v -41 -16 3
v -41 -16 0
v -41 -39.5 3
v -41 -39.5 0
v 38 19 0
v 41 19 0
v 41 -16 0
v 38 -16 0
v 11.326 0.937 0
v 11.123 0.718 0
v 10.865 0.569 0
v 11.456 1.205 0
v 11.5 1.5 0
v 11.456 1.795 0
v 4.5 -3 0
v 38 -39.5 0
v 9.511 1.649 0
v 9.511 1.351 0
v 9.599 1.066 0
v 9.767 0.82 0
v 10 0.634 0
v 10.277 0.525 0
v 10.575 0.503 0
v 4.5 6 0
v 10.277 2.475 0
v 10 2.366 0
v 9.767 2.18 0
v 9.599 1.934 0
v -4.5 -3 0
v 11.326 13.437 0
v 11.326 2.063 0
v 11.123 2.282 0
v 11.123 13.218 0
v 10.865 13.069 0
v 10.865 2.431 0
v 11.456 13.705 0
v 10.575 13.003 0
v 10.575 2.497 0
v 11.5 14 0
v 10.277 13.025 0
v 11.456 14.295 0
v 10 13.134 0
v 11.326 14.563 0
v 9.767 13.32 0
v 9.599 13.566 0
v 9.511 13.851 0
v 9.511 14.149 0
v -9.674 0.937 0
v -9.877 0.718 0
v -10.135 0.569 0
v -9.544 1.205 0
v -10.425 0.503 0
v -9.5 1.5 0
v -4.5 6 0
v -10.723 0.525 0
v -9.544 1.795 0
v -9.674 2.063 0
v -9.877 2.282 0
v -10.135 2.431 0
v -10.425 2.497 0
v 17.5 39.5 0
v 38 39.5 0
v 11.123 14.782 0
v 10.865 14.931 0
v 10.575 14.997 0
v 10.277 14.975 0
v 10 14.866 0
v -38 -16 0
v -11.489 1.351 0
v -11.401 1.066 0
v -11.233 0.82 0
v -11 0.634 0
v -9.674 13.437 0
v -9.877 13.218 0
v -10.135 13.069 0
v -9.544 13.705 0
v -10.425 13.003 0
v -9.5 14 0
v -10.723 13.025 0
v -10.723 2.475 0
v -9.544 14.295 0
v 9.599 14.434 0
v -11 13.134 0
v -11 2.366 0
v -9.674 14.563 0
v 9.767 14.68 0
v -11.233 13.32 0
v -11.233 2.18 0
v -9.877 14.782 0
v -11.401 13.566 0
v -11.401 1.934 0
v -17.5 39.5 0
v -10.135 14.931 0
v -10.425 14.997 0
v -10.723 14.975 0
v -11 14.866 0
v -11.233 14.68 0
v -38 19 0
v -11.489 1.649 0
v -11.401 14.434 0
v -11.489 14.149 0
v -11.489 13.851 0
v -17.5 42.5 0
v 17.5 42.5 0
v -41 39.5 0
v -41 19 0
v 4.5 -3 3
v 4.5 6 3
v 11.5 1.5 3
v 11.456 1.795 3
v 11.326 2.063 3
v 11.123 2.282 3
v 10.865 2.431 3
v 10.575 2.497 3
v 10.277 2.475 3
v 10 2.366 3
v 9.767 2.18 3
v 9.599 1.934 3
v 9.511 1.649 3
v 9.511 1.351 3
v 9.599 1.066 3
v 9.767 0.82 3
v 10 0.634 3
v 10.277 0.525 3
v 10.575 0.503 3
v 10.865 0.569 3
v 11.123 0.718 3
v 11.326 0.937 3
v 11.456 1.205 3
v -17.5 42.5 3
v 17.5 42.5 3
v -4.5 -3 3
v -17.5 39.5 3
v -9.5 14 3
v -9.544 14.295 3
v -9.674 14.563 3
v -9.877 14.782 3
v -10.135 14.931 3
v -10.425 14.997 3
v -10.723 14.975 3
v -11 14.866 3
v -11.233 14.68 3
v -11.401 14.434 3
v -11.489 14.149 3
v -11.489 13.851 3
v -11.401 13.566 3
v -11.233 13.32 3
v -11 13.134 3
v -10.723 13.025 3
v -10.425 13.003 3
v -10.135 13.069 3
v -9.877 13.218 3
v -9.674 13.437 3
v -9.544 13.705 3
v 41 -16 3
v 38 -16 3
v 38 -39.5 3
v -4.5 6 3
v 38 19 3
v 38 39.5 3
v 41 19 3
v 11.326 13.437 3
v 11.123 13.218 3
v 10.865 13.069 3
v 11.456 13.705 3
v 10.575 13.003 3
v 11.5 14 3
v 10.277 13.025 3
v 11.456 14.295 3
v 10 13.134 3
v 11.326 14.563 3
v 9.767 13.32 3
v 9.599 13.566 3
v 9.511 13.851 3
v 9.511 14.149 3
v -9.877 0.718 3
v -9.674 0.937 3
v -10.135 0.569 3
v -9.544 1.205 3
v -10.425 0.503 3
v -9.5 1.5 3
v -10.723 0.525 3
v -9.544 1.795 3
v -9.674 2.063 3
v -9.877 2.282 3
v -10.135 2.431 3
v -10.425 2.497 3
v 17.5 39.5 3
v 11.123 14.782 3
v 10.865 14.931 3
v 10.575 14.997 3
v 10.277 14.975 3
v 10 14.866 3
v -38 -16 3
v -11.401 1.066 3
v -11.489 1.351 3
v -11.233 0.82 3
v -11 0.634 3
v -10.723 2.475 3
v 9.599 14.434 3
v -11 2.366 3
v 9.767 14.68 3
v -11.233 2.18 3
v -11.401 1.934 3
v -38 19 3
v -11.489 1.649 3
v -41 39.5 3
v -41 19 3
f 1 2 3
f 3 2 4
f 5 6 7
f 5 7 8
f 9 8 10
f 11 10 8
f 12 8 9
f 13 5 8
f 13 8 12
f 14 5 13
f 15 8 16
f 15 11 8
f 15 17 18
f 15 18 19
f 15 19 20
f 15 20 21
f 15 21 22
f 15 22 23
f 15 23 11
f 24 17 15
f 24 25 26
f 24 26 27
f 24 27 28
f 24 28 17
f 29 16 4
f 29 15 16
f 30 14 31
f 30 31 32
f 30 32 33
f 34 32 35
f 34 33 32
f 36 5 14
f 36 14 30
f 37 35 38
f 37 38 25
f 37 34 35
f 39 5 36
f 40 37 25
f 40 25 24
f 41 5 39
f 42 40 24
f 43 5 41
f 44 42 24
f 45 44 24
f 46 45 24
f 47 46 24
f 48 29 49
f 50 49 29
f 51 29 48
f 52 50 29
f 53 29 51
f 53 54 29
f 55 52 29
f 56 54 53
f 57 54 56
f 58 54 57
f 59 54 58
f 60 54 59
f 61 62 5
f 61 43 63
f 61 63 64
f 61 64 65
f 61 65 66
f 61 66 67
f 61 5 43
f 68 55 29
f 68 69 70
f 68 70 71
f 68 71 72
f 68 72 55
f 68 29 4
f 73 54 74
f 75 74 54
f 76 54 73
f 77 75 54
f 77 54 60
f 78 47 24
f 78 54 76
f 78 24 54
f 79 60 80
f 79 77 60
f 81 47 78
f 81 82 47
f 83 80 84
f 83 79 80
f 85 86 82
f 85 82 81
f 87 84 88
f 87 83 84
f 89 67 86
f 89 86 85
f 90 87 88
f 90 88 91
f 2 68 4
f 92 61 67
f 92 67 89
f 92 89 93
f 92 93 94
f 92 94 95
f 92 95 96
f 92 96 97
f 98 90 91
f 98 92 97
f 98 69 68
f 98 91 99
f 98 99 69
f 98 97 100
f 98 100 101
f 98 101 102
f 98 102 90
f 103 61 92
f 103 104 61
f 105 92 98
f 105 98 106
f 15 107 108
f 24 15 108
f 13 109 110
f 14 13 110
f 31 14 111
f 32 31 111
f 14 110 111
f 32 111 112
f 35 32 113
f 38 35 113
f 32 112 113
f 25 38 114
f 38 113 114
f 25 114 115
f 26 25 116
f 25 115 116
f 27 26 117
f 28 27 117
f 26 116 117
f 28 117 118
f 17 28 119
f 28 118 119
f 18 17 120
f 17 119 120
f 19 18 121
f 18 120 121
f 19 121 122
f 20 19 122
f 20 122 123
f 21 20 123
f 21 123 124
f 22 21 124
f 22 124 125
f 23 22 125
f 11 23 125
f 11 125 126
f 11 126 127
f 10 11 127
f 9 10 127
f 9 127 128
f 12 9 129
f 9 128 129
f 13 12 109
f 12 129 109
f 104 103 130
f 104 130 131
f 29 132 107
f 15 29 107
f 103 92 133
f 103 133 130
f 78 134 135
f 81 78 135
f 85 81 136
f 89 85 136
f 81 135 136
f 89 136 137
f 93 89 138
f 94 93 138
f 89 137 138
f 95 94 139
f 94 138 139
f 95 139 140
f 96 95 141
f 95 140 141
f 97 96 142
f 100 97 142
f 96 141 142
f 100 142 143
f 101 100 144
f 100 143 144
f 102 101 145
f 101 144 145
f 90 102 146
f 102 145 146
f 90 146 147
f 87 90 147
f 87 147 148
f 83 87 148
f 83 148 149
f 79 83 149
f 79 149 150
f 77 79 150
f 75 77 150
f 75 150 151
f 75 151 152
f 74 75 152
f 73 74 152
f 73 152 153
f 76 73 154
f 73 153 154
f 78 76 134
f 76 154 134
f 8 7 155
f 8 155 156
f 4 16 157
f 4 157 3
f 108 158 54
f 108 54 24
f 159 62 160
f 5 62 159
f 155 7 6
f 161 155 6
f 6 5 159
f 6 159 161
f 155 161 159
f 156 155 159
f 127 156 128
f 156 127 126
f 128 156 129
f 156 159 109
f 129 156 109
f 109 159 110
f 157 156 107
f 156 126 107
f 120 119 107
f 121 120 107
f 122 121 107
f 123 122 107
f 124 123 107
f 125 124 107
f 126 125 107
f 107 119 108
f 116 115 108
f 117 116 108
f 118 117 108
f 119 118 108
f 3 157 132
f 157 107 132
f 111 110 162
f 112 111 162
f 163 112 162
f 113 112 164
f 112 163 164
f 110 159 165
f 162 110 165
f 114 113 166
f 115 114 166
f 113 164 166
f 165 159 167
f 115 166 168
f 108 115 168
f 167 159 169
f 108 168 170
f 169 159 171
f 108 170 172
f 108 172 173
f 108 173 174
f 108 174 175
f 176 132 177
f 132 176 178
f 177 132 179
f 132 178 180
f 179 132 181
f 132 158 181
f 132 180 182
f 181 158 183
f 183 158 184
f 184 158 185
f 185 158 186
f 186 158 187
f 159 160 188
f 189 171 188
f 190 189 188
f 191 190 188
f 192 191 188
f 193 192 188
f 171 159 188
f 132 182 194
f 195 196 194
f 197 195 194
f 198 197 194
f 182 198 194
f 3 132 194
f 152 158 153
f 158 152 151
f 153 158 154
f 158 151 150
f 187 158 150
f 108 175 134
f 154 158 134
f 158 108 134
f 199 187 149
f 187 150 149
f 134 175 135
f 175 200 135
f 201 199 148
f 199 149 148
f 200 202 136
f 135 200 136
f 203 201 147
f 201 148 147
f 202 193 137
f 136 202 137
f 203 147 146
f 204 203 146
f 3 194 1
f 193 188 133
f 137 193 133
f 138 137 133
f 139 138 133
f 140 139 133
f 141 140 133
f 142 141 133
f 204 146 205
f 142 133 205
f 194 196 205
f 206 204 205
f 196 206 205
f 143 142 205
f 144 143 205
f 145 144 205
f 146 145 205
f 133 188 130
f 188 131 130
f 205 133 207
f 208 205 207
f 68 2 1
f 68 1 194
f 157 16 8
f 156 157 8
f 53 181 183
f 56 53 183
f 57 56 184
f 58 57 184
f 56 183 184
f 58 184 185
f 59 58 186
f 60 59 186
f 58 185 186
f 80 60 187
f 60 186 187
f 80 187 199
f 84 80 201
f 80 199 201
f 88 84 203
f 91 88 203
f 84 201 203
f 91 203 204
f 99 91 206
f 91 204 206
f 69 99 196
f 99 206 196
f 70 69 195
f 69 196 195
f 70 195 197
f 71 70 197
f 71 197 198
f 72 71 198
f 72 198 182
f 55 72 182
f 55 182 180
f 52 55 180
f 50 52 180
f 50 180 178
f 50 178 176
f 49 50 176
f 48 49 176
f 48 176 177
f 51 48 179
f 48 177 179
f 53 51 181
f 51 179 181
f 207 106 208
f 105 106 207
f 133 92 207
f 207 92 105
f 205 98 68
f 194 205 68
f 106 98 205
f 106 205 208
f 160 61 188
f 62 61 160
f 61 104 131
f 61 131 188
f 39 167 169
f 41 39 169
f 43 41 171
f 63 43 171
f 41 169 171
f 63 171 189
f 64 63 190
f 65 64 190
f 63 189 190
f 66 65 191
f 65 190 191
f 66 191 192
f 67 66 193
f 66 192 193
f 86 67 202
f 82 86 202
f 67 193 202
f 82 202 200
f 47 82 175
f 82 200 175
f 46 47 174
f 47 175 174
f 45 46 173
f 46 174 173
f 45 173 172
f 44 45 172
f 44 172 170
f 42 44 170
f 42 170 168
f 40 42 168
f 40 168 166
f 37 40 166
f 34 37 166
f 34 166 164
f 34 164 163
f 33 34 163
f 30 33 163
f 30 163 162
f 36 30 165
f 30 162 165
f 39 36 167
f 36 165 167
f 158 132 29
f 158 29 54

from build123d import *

# Parameters (mm, degrees)
BOSS_EXTRUDE1_DEPTH = 3
SKETCH2_R           = 1
SKETCH2_W           = 9
SKETCH2_H           = 9
CUT_EXTRUDE1_DEPTH  = 3


with BuildPart() as part:
    # Sketch1 → Boss-Extrude1 (new body)
    with BuildSketch(Plane.XY):
        Polygon((-38, 39.5), (-17.5, 39.5), (-17.5, 42.5), (17.5, 42.5), (17.5, 39.5), (38, 39.5), (38, 19), (41, 19), (41, 16), (41, -16), (38, -16), (38, -19), (38, -39.5), (-41, -39.5), (-41, -19), (-41, -16), (-38, -16), (-38, 16), (-38, 19), (-41, 19), (-41, 39.5), align=None)
    extrude(amount=BOSS_EXTRUDE1_DEPTH)

    # Sketch2 → Cut-Extrude1 (cut)
    with BuildSketch(Plane.XY.offset(3)):
        with Locations((-10.5, 14)):
            Circle(SKETCH2_R)
        with Locations((-10.5, 1.5)):
            Circle(SKETCH2_R)
        with Locations((10.5, 1.5)):
            Circle(SKETCH2_R)
        with Locations((10.5, 14)):
            Circle(SKETCH2_R)
        with Locations((0, 1.5)):
            Rectangle(SKETCH2_W, SKETCH2_H)
    extrude(amount=-CUT_EXTRUDE1_DEPTH, mode=Mode.SUBTRACT)


solid = part.part
